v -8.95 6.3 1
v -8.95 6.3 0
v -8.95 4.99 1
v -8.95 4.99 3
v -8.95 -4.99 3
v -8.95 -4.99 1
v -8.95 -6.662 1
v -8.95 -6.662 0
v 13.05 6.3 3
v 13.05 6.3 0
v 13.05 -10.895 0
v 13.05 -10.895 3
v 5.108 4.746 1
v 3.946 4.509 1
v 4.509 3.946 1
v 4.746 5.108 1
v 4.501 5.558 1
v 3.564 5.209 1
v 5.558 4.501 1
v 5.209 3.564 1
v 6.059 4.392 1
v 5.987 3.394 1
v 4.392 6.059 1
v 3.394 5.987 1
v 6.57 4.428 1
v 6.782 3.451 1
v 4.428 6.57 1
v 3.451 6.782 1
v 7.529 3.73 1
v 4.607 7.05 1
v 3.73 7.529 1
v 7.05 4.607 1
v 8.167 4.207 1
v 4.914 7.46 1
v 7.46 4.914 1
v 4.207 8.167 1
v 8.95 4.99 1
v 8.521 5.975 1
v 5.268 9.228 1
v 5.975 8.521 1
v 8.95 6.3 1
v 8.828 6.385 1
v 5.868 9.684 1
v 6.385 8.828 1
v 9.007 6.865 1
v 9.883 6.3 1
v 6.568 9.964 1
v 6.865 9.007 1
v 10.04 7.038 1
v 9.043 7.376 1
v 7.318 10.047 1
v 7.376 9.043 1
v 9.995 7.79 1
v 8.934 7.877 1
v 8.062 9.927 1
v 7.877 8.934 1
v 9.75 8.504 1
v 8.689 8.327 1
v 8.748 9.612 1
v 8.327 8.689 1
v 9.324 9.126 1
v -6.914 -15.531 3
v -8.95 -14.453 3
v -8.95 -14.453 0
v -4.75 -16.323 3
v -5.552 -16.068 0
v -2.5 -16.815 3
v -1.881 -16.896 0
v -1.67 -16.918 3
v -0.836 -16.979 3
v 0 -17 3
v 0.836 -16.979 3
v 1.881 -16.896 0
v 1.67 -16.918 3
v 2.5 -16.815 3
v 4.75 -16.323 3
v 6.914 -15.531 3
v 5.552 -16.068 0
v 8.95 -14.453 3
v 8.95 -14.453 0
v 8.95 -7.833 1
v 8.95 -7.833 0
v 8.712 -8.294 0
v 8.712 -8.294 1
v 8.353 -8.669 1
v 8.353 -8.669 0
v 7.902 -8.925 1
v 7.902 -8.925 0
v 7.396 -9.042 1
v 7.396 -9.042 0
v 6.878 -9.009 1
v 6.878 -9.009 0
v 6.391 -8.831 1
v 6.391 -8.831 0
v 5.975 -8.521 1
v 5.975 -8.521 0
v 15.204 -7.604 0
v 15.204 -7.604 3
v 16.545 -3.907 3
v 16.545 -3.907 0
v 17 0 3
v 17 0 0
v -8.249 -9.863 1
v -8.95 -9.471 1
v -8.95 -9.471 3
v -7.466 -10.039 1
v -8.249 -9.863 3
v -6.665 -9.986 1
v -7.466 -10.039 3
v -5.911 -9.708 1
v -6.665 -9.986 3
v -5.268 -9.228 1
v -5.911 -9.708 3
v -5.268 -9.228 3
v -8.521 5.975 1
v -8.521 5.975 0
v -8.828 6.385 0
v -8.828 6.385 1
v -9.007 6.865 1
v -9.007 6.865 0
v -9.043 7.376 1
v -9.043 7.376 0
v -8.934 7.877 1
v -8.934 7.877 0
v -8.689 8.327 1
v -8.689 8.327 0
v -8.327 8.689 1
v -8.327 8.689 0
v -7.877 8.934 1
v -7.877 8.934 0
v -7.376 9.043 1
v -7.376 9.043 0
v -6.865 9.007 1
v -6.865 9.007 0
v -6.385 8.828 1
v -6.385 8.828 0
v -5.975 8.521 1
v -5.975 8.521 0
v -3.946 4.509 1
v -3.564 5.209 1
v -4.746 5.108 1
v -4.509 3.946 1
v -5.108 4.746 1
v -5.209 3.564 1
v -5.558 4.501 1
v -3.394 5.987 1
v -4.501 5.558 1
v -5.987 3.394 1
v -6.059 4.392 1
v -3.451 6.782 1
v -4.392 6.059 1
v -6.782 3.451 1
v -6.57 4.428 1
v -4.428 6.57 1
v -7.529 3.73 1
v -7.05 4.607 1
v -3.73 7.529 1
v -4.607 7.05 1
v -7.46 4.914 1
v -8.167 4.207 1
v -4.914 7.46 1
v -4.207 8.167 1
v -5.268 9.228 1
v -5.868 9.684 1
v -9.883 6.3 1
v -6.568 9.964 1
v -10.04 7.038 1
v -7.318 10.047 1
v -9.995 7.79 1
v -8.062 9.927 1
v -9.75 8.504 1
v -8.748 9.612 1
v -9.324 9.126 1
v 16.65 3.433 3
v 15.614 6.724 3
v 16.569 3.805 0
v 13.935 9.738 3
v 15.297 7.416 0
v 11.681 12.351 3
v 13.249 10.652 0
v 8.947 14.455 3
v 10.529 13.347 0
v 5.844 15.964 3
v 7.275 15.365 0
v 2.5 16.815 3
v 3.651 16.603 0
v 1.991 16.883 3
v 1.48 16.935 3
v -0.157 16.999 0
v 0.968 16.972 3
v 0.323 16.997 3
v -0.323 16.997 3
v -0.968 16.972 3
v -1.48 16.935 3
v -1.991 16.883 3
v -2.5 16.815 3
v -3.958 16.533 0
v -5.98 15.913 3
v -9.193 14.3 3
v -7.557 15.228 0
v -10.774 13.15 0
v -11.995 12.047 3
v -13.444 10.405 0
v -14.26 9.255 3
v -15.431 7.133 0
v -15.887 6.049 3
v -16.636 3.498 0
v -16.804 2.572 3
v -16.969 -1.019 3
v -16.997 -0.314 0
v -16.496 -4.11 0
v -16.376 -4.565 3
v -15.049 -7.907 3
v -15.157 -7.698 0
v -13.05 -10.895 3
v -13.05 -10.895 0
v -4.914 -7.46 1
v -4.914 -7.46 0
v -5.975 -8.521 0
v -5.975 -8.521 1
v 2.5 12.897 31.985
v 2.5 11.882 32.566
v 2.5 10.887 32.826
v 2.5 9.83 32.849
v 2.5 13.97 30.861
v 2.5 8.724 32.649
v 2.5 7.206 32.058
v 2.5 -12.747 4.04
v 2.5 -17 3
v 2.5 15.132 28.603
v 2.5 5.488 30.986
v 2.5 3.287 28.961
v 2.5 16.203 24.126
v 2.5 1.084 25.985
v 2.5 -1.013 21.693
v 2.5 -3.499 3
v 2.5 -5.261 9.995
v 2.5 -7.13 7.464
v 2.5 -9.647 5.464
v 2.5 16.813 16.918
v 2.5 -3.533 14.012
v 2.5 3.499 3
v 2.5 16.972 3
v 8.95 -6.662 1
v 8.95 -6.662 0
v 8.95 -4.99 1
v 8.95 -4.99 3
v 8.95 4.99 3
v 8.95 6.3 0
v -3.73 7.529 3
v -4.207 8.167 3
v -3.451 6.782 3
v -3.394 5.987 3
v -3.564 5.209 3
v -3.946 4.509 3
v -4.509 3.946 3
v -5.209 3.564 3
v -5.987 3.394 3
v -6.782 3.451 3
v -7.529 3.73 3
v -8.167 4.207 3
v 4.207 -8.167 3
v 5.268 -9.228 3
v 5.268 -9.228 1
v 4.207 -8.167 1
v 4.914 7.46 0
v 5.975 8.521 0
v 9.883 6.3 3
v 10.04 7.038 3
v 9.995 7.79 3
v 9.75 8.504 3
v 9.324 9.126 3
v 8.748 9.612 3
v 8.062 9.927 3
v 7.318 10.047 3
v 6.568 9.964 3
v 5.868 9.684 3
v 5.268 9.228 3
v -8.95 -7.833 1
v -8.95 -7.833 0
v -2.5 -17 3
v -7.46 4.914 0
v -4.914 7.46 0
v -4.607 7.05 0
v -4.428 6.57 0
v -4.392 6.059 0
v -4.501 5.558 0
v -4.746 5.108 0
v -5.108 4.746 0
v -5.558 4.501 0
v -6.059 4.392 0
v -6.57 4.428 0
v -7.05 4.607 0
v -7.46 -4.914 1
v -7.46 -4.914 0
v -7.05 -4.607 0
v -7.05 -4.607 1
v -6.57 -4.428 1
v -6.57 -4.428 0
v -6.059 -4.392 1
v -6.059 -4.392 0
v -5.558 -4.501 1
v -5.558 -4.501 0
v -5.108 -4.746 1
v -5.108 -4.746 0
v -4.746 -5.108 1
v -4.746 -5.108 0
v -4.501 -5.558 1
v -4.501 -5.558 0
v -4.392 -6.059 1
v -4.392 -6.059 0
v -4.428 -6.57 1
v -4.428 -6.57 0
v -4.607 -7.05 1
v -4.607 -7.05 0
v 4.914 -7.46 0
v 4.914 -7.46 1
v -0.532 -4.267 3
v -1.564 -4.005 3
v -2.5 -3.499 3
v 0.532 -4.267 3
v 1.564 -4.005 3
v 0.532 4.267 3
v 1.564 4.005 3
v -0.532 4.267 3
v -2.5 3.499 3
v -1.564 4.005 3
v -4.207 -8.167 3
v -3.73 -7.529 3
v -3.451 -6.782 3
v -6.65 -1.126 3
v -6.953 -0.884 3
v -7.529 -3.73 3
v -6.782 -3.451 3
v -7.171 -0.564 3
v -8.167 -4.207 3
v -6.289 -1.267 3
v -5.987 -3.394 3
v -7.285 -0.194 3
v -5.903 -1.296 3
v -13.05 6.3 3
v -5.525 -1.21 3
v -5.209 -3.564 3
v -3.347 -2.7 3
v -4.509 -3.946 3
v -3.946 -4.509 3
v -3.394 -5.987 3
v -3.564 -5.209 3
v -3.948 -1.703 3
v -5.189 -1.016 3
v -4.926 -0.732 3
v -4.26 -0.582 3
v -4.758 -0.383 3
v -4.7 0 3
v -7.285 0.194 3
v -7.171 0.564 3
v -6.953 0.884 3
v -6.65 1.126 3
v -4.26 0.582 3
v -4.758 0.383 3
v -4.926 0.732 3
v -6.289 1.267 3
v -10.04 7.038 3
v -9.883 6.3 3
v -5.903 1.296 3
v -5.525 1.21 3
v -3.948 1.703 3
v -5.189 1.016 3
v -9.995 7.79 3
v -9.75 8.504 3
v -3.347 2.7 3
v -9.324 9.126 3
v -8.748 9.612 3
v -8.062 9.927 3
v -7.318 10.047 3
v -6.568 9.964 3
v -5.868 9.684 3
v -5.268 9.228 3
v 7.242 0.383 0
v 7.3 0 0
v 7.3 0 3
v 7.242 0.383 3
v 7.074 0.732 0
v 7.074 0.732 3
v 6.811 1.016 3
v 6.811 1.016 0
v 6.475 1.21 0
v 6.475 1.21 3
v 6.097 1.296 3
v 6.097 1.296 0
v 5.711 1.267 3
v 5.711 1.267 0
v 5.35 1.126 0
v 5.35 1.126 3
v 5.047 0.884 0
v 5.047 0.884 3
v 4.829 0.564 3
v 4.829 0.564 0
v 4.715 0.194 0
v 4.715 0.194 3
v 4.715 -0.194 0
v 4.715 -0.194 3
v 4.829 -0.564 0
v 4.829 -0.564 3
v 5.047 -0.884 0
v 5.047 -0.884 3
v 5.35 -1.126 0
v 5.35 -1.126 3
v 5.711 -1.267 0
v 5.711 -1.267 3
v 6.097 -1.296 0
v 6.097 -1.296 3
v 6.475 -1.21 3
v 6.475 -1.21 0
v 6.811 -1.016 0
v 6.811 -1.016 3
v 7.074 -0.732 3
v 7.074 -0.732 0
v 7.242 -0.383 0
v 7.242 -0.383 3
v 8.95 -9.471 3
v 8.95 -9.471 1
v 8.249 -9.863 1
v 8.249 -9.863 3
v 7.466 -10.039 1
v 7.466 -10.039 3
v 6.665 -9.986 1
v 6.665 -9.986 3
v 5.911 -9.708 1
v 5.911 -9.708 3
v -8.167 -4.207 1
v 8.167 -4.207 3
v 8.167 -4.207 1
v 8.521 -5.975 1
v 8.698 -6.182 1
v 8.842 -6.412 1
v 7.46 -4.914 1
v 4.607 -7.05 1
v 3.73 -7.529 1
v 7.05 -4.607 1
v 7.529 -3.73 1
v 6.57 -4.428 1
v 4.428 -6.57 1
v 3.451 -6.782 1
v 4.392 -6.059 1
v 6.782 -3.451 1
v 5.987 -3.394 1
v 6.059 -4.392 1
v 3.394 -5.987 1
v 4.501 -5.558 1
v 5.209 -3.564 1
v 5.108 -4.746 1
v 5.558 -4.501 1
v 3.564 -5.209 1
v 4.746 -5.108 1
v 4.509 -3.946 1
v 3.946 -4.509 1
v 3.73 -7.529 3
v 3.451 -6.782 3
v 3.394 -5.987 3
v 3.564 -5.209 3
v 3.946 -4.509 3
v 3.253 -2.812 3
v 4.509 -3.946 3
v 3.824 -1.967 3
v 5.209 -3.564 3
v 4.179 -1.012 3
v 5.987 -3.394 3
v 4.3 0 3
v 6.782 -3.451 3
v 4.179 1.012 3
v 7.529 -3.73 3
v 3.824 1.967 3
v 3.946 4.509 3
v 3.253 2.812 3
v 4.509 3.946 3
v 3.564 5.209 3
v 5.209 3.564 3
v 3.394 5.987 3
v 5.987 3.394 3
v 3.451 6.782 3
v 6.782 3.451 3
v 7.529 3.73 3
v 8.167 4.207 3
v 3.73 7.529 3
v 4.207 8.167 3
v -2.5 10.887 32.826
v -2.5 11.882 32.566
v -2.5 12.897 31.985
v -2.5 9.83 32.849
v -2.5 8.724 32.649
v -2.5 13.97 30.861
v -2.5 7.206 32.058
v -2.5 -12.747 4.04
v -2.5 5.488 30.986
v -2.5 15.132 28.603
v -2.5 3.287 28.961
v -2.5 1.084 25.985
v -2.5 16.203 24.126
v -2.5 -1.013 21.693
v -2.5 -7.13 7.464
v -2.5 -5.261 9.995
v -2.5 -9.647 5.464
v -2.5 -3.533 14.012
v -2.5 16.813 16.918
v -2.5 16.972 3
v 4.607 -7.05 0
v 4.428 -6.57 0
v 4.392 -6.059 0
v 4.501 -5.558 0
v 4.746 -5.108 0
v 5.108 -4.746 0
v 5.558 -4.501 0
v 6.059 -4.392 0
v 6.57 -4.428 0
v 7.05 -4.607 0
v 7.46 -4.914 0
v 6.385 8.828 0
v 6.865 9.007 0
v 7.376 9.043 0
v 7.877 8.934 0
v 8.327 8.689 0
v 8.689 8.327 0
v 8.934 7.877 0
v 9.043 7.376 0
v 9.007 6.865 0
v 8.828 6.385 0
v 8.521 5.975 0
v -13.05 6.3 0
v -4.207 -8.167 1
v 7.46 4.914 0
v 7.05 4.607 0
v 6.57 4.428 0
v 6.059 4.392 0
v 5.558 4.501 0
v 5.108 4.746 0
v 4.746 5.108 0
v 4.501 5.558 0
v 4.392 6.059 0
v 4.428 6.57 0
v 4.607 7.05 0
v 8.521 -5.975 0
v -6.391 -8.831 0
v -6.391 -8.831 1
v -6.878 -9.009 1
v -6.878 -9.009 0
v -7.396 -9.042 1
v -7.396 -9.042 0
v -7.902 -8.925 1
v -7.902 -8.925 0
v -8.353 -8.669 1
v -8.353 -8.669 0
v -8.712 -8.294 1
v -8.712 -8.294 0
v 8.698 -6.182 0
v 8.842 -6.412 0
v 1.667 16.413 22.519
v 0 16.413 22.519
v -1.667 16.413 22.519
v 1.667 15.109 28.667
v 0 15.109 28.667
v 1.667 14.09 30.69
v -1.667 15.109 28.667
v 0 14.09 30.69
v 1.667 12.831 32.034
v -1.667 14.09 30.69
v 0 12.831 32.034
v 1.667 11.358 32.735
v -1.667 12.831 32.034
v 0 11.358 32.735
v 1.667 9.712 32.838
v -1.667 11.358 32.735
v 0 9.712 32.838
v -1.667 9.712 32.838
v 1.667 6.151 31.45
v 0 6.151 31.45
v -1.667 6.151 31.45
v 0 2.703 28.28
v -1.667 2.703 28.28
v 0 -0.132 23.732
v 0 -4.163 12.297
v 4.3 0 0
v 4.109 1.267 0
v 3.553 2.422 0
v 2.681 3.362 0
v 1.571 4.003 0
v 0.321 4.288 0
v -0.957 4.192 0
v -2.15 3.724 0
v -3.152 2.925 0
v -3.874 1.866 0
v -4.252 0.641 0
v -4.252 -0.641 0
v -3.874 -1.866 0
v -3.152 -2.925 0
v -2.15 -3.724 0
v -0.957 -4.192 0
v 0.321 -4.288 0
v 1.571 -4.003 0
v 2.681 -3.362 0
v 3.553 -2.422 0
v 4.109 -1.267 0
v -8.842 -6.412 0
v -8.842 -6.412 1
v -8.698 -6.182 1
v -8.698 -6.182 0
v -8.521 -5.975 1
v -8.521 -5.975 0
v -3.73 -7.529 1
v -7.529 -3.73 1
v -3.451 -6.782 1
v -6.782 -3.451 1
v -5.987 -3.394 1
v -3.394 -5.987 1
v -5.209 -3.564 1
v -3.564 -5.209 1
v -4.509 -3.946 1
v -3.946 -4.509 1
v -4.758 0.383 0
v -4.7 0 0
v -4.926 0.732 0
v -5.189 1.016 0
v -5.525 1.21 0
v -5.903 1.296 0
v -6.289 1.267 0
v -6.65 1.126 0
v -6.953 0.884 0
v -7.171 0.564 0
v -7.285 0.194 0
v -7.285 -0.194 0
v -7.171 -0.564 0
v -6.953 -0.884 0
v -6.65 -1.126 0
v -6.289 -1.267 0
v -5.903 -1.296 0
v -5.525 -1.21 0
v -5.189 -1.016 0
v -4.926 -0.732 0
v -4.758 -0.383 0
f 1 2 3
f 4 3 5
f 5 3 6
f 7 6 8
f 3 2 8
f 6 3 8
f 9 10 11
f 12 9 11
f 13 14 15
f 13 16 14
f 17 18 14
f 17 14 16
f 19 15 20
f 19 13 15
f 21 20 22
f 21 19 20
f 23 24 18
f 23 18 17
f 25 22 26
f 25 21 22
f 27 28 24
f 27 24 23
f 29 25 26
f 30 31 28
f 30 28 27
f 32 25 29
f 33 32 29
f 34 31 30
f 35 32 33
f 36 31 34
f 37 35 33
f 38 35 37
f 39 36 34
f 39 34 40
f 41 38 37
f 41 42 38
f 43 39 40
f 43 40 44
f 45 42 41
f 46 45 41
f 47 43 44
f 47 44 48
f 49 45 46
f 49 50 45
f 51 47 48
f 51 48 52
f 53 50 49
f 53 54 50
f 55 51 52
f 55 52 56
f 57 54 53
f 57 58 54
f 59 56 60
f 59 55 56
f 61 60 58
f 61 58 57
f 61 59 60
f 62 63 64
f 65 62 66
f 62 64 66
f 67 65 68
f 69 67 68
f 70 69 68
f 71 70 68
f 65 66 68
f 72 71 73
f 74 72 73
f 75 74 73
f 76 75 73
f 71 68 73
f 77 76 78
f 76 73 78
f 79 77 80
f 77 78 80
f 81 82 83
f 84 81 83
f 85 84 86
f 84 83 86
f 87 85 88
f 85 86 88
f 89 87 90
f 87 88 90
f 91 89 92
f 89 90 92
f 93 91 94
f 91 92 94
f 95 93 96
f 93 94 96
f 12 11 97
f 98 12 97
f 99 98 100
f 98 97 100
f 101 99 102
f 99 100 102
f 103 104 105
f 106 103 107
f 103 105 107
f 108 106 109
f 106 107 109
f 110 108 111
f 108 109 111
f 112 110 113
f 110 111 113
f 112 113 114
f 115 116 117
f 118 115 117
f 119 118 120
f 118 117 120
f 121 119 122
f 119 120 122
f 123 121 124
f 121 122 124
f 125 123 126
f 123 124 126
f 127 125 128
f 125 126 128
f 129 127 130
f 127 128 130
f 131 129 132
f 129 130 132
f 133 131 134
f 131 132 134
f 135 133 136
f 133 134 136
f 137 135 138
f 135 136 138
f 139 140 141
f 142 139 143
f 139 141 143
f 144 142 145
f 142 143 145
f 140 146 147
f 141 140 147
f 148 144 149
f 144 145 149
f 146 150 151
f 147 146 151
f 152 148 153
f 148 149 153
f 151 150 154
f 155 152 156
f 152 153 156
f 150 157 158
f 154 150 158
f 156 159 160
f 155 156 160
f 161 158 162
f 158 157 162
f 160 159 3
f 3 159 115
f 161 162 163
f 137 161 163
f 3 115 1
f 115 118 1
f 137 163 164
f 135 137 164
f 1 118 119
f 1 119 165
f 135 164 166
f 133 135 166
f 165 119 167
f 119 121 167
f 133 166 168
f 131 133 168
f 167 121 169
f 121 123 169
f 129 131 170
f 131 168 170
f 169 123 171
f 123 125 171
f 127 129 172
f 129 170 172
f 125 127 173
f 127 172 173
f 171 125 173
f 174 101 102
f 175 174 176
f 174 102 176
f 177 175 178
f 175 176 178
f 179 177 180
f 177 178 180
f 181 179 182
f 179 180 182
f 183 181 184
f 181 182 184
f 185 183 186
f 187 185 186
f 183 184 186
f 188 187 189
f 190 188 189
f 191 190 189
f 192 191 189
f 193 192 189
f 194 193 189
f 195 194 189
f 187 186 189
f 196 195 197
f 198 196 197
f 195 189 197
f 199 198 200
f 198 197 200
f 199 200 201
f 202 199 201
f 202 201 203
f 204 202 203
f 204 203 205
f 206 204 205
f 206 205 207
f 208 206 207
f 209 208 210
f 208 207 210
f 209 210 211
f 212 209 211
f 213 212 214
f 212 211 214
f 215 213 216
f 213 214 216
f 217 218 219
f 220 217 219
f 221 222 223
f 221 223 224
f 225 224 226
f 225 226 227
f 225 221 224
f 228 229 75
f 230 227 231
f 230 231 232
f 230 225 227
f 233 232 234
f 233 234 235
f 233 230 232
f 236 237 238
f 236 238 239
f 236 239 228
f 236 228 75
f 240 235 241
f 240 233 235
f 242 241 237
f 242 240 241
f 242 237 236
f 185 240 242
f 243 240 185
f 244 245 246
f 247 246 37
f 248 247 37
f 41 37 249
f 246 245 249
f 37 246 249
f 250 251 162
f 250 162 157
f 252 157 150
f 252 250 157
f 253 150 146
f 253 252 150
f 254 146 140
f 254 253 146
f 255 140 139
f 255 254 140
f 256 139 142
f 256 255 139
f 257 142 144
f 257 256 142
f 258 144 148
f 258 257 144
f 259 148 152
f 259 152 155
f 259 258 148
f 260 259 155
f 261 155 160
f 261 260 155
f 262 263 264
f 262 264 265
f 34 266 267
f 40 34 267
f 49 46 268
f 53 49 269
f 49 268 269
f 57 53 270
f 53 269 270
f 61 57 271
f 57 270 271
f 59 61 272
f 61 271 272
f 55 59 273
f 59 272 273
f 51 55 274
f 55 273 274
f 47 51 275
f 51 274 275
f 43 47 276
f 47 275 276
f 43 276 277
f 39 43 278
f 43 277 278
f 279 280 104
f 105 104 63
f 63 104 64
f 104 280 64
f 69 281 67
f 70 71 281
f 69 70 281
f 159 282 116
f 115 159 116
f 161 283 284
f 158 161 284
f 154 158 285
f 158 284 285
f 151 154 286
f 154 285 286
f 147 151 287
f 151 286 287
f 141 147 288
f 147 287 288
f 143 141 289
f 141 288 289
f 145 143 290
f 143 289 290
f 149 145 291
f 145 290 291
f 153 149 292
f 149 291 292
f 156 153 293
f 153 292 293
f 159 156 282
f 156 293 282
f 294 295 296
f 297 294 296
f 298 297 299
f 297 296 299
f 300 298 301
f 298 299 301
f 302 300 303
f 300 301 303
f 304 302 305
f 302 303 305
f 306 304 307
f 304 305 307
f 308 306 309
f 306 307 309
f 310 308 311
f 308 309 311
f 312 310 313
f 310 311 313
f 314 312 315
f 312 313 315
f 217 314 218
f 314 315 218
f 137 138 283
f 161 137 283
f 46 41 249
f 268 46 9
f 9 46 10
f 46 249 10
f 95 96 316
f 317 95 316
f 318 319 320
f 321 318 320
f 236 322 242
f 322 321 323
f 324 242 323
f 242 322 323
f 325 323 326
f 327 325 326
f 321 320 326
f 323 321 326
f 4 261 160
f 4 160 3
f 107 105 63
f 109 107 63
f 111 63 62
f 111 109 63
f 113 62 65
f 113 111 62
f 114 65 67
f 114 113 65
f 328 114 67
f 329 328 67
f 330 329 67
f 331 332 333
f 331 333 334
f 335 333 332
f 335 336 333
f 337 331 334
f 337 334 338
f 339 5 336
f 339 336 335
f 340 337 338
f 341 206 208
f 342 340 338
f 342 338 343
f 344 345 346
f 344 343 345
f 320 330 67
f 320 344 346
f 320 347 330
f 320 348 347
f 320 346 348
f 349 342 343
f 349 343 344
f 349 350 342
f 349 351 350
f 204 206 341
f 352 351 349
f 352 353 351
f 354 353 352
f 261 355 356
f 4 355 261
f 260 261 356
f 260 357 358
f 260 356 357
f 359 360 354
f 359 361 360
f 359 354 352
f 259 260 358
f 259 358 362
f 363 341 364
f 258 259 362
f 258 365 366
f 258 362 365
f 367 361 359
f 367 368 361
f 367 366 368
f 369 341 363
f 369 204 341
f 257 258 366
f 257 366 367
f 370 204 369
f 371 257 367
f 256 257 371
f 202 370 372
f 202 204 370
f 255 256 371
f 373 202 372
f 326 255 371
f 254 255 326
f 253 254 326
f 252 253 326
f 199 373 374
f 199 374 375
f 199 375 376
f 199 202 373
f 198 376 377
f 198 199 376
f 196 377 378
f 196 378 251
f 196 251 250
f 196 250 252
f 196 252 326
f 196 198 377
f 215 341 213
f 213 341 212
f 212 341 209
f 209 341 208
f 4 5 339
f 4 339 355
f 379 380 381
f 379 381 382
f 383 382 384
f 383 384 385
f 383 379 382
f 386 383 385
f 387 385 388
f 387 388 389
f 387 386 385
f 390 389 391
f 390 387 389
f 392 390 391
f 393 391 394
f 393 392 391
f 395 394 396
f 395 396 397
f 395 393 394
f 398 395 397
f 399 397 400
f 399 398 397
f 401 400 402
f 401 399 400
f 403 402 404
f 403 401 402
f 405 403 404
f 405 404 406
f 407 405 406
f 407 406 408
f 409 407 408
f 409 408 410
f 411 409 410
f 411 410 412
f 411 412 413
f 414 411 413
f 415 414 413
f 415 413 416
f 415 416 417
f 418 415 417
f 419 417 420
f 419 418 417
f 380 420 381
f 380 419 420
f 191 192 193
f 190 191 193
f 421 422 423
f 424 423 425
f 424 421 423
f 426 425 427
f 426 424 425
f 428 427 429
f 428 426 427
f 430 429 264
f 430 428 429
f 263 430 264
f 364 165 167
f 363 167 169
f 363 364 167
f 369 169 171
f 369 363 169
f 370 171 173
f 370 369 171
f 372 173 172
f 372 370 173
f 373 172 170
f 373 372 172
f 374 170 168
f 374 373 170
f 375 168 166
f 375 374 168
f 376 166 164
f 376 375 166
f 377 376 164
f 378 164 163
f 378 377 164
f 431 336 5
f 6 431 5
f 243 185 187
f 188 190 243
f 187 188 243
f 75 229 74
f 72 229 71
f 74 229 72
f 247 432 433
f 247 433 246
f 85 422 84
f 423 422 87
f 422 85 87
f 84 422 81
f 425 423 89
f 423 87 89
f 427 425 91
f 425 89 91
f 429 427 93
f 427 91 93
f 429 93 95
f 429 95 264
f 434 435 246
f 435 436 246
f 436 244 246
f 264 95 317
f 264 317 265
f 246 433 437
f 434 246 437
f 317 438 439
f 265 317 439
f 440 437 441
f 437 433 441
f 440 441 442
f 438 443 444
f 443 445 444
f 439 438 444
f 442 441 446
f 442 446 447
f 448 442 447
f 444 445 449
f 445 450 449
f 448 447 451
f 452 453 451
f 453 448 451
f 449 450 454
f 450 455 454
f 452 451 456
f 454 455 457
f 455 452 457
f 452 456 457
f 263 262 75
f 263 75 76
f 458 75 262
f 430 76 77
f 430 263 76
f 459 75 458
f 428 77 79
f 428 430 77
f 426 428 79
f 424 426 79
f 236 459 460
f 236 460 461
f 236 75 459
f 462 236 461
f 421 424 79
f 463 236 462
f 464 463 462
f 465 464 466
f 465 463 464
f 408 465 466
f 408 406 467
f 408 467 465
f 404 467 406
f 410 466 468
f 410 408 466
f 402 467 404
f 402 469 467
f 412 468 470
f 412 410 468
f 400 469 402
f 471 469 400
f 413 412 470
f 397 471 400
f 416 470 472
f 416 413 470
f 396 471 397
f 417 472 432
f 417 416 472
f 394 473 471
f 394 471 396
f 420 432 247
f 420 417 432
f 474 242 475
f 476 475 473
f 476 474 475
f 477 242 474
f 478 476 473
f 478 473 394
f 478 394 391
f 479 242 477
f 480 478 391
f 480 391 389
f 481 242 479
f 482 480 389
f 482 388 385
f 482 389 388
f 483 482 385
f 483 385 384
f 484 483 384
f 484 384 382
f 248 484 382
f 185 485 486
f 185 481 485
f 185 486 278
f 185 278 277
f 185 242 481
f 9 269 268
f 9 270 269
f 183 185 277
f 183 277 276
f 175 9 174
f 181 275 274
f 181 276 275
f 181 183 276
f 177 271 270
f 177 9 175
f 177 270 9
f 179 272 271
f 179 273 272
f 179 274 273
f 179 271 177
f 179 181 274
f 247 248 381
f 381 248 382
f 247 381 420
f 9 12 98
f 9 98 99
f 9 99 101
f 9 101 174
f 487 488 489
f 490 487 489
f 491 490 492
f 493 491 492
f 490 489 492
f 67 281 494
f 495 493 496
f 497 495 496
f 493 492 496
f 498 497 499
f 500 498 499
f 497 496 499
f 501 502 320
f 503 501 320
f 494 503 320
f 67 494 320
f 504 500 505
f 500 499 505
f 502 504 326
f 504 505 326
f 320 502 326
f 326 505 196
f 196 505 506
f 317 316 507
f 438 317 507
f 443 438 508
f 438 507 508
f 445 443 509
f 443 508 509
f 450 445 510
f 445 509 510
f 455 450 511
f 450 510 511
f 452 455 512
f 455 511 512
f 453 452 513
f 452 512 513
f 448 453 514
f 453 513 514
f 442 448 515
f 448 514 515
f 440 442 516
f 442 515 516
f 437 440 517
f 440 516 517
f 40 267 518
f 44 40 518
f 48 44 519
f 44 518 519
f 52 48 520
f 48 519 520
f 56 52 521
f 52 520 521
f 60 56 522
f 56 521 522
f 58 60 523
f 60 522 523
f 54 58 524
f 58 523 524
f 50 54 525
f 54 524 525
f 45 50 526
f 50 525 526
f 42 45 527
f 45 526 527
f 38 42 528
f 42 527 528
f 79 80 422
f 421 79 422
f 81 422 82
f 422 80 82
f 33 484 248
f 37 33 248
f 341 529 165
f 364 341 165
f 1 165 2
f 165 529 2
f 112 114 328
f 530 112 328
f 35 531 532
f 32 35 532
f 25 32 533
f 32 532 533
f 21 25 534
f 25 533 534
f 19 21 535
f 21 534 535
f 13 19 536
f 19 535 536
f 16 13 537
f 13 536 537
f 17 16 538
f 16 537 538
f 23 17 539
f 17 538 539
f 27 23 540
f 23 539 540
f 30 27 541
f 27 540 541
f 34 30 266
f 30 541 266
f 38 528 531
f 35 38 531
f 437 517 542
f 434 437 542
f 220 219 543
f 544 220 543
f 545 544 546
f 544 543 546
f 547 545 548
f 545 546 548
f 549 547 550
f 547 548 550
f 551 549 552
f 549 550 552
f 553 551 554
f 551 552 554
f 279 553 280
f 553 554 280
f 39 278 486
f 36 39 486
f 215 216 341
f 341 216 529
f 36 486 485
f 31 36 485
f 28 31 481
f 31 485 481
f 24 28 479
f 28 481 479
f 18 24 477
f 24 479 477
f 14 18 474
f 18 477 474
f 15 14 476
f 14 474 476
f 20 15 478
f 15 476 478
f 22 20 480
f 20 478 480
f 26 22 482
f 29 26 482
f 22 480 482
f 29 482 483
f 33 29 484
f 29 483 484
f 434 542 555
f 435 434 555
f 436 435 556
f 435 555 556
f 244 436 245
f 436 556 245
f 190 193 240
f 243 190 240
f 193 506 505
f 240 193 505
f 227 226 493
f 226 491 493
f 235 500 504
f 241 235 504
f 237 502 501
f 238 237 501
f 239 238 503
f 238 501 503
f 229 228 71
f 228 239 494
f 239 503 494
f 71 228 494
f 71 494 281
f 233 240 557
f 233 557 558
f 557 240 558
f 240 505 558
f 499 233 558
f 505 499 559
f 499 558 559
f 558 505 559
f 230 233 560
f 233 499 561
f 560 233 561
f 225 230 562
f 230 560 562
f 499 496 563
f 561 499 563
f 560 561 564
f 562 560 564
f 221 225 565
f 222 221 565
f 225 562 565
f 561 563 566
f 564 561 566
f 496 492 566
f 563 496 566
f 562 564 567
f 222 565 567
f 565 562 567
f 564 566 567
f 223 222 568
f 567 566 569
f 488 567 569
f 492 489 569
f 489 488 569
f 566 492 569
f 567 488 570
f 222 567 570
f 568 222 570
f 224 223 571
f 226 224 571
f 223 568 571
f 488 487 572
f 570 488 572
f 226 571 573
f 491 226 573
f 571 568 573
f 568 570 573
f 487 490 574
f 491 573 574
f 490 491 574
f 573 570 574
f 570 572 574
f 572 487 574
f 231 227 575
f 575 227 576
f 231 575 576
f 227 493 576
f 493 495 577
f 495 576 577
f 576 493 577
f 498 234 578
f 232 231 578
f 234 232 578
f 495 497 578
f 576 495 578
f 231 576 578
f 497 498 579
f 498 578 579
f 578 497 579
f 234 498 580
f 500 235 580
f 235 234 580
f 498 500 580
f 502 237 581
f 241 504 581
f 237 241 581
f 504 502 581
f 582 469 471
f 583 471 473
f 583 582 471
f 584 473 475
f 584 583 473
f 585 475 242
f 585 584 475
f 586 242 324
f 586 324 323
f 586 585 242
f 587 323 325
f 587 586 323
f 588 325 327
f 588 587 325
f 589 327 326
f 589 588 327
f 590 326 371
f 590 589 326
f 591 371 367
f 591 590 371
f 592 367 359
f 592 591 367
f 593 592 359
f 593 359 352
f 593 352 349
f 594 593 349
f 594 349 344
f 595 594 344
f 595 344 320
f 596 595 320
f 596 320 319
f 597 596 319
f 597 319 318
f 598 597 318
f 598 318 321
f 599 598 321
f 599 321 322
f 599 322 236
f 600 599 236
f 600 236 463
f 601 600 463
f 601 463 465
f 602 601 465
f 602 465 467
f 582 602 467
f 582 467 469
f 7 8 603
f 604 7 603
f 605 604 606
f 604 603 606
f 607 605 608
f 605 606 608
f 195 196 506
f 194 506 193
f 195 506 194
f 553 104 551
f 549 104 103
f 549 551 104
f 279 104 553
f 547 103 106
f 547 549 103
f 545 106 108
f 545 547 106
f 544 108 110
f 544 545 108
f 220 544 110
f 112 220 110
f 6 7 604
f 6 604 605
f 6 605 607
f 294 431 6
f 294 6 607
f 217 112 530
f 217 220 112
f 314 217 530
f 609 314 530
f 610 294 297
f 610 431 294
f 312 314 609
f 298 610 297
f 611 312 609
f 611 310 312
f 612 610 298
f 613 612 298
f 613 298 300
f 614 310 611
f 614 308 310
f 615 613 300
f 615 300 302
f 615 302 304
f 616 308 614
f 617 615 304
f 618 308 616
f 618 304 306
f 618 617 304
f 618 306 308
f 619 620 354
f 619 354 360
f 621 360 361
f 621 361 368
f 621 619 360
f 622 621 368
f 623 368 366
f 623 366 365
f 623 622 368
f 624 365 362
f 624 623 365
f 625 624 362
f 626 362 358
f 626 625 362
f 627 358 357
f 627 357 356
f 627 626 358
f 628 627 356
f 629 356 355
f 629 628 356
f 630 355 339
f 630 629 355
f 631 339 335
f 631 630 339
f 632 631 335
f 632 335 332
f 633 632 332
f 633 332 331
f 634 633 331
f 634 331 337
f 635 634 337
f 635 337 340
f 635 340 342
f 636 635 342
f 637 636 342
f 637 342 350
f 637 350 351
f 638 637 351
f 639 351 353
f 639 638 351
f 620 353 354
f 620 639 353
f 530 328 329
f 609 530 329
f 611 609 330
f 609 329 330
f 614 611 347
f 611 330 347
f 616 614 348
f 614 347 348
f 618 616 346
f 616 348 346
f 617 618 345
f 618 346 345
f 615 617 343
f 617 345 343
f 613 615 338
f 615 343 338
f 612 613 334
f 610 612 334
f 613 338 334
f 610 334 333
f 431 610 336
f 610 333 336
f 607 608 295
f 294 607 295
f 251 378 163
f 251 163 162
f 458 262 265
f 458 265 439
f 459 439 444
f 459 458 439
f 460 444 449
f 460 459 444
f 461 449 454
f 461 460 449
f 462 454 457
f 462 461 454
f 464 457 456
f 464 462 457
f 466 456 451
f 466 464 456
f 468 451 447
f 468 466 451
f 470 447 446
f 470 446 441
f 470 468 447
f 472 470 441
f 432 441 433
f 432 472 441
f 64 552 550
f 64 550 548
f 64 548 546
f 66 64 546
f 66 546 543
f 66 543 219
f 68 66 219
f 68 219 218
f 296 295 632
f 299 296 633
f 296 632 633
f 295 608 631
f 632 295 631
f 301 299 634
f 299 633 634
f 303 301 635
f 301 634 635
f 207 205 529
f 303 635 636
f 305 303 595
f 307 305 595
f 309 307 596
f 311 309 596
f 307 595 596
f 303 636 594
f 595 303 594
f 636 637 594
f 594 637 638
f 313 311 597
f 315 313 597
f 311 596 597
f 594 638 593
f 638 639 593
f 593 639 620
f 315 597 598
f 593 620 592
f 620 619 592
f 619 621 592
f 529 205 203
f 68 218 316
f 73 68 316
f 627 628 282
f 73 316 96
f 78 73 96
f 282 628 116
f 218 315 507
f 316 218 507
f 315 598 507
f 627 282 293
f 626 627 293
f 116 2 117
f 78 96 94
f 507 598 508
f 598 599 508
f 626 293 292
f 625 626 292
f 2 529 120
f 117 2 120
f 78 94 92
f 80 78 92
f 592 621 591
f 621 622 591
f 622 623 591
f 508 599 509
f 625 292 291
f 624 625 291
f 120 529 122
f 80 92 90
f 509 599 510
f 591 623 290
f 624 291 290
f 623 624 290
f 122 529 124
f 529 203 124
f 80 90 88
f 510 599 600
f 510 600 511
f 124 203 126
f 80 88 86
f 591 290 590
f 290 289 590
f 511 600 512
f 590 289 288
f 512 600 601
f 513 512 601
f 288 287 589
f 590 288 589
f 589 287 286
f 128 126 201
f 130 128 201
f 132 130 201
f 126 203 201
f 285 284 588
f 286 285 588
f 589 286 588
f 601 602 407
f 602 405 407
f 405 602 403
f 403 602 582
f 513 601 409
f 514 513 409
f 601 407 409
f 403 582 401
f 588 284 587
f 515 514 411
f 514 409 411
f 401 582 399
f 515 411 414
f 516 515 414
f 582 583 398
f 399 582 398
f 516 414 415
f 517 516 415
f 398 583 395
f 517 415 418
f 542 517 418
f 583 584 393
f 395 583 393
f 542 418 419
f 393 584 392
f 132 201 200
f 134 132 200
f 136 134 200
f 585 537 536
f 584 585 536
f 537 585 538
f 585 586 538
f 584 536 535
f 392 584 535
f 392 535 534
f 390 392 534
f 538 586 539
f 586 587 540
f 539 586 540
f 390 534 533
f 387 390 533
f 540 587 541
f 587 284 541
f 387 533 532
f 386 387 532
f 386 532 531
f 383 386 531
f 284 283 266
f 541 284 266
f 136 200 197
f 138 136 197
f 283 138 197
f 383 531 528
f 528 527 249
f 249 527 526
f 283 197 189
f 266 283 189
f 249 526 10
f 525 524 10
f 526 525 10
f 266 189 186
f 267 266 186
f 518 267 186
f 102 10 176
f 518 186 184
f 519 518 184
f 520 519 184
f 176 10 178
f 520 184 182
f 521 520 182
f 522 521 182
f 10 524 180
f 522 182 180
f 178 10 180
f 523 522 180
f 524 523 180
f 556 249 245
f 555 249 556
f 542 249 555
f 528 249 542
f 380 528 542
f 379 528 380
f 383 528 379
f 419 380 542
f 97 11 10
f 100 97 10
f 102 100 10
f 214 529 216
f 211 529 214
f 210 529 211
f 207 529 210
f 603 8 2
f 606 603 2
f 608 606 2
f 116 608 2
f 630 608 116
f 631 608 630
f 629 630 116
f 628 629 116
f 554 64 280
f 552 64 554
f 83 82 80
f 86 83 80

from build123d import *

# Parameters (mm, degrees)
SKETCH_2_R          = 1.3
SKETCH_2_R_2        = 4.3
EXTRUDE_1_DEPTH     = 3
CUT_EXTRUDE_1_DEPTH = 2
EXTRUDE_START       = -2.5
EXTRUDE_2_DEPTH     = 5


# Read off the part's stored shape, not the designer's step: 凸台-拉伸2
with BuildPart() as part:
    # 草图2 → 凸台-拉伸1 (new body)
    with BuildSketch(Plane.XY):
        with BuildLine():
            Line((8.95, -6.662467126), (8.95, 6.3))
            Line((8.95, 6.3), (13.05, 6.3))
            Line((13.05, 6.3), (13.05, -10.894838227))
            ThreePointArc((13.05, -10.894838227), (15.982021149, -5.794393842), (17, 0))
            ThreePointArc((17, 0), (-5.794393842, 15.982021149), (-13.05, -10.894838227))
            Line((-13.05, -10.894838227), (-13.05, 6.3))
            Line((-13.05, 6.3), (-8.95, 6.3))
            Line((-8.95, 6.3), (-8.95, -6.662467126))
            ThreePointArc((-8.95, -6.662467126), (-8.774511871, -6.294279218), (-8.520636713, -5.975052301))
            Line((-8.520636713, -5.975052301), (-7.459976542, -4.914392129))
            ThreePointArc((-7.459976542, -4.914392129), (-4.914392129, -4.914392129), (-4.914392129, -7.459976542))
            Line((-4.914392129, -7.459976542), (-5.975052301, -8.520636713))
            ThreePointArc((-5.975052301, -8.520636713), (-7.65308887, -9.001633835), (-8.95, -7.833221888))
            Line((-8.95, -7.833221888), (-8.95, -14.453286823))
            ThreePointArc((-8.95, -14.453286823), (0, -17), (8.95, -14.453286823))
            Line((8.95, -14.453286823), (8.95, -7.833221888))
            ThreePointArc((8.95, -7.833221888), (7.65308887, -9.001633835), (5.975052301, -8.520636713))
            Line((5.975052301, -8.520636713), (4.914392129, -7.459976542))
            ThreePointArc((4.914392129, -7.459976542), (4.914392129, -4.914392129), (7.459976542, -4.914392129))
            Line((7.459976542, -4.914392129), (8.520636713, -5.975052301))
            ThreePointArc((8.520636713, -5.975052301), (8.774511871, -6.294279218), (8.95, -6.662467126))
        make_face()
        with Locations((-6, 0)):
            Circle(SKETCH_2_R, mode=Mode.SUBTRACT)
        with BuildLine():
            ThreePointArc((-8.520636713, 5.975052301), (-8.520636713, 8.520636713), (-5.975052301, 8.520636713))
            Line((-5.975052301, 8.520636713), (-4.914392129, 7.459976542))
            ThreePointArc((-4.914392129, 7.459976542), (-4.914392129, 4.914392129), (-7.459976542, 4.914392129))
            Line((-7.459976542, 4.914392129), (-8.520636713, 5.975052301))
        make_face(mode=Mode.SUBTRACT)
        Circle(SKETCH_2_R_2, mode=Mode.SUBTRACT)
        with Locations((6, 0)):
            Circle(SKETCH_2_R, mode=Mode.SUBTRACT)
        with BuildLine():
            Line((4.914392129, 7.459976542), (5.975052301, 8.520636713))
            ThreePointArc((5.975052301, 8.520636713), (8.520636713, 8.520636713), (8.520636713, 5.975052301))
            Line((8.520636713, 5.975052301), (7.459976542, 4.914392129))
            ThreePointArc((7.459976542, 4.914392129), (4.914392129, 4.914392129), (4.914392129, 7.459976542))
        make_face(mode=Mode.SUBTRACT)
    extrude(amount=EXTRUDE_1_DEPTH)

    # 草图10 → 切除-拉伸1 (cut)
    with BuildSketch(Plane.XY.offset(3)):
        with BuildLine():
            Line((-5.26794552, 9.227743494), (-4.207285348, 8.167083323))
            ThreePointArc((-4.207285348, 8.167083323), (-4.207285348, 4.207285348), (-8.167083323, 4.207285348))
            Line((-8.167083323, 4.207285348), (-9.227743494, 5.26794552))
            ThreePointArc((-9.227743494, 5.26794552), (-9.227743494, 9.227743494), (-5.26794552, 9.227743494))
        make_face()
        with BuildLine():
            Line((-5.26794552, -9.227743494), (-4.207285348, -8.167083323))
            ThreePointArc((-4.207285348, -8.167083323), (-4.207285348, -4.207285348), (-8.167083323, -4.207285348))
            Line((-8.167083323, -4.207285348), (-9.227743494, -5.26794552))
            ThreePointArc((-9.227743494, -5.26794552), (-9.227743494, -9.227743494), (-5.26794552, -9.227743494))
        make_face()
        with BuildLine():
            Line((5.26794552, 9.227743494), (4.207285348, 8.167083323))
            ThreePointArc((4.207285348, 8.167083323), (4.207285348, 4.207285348), (8.167083323, 4.207285348))
            Line((8.167083323, 4.207285348), (9.227743494, 5.26794552))
            ThreePointArc((9.227743494, 5.26794552), (9.227743494, 9.227743494), (5.26794552, 9.227743494))
        make_face()
        with BuildLine():
            Line((5.26794552, -9.227743494), (4.207285348, -8.167083323))
            ThreePointArc((4.207285348, -8.167083323), (4.207285348, -4.207285348), (8.167083323, -4.207285348))
            Line((8.167083323, -4.207285348), (9.227743494, -5.26794552))
            ThreePointArc((9.227743494, -5.26794552), (9.227743494, -9.227743494), (5.26794552, -9.227743494))
        make_face()
    extrude(amount=-CUT_EXTRUDE_1_DEPTH, mode=Mode.SUBTRACT)

    # 凸台-拉伸2 outline → 凸台-拉伸2 (add)
    with BuildSketch(Plane(origin=(0, 0, 0), x_dir=(0, 0, -1), z_dir=(1, 0, 0)).offset(EXTRUDE_START)):
        with BuildLine():
            Line((-3, -17), (-3, 16.972406415))
            add(Edge.make_bspline(
                [(-3, 16.972406415), (-25.437844455, 16.972406415), (-46.151426454, 17.052198571), (-33, 11.429456716), (-30.458299322, -17), (-7.505407539, 10.413690357), (-3, -17)],
                knots=[0, 0, 0, 0, 0, 0, 0, 1, 1, 1, 1, 1, 1, 1], degree=6))
        make_face()
    extrude(amount=EXTRUDE_2_DEPTH)


solid = part.part
